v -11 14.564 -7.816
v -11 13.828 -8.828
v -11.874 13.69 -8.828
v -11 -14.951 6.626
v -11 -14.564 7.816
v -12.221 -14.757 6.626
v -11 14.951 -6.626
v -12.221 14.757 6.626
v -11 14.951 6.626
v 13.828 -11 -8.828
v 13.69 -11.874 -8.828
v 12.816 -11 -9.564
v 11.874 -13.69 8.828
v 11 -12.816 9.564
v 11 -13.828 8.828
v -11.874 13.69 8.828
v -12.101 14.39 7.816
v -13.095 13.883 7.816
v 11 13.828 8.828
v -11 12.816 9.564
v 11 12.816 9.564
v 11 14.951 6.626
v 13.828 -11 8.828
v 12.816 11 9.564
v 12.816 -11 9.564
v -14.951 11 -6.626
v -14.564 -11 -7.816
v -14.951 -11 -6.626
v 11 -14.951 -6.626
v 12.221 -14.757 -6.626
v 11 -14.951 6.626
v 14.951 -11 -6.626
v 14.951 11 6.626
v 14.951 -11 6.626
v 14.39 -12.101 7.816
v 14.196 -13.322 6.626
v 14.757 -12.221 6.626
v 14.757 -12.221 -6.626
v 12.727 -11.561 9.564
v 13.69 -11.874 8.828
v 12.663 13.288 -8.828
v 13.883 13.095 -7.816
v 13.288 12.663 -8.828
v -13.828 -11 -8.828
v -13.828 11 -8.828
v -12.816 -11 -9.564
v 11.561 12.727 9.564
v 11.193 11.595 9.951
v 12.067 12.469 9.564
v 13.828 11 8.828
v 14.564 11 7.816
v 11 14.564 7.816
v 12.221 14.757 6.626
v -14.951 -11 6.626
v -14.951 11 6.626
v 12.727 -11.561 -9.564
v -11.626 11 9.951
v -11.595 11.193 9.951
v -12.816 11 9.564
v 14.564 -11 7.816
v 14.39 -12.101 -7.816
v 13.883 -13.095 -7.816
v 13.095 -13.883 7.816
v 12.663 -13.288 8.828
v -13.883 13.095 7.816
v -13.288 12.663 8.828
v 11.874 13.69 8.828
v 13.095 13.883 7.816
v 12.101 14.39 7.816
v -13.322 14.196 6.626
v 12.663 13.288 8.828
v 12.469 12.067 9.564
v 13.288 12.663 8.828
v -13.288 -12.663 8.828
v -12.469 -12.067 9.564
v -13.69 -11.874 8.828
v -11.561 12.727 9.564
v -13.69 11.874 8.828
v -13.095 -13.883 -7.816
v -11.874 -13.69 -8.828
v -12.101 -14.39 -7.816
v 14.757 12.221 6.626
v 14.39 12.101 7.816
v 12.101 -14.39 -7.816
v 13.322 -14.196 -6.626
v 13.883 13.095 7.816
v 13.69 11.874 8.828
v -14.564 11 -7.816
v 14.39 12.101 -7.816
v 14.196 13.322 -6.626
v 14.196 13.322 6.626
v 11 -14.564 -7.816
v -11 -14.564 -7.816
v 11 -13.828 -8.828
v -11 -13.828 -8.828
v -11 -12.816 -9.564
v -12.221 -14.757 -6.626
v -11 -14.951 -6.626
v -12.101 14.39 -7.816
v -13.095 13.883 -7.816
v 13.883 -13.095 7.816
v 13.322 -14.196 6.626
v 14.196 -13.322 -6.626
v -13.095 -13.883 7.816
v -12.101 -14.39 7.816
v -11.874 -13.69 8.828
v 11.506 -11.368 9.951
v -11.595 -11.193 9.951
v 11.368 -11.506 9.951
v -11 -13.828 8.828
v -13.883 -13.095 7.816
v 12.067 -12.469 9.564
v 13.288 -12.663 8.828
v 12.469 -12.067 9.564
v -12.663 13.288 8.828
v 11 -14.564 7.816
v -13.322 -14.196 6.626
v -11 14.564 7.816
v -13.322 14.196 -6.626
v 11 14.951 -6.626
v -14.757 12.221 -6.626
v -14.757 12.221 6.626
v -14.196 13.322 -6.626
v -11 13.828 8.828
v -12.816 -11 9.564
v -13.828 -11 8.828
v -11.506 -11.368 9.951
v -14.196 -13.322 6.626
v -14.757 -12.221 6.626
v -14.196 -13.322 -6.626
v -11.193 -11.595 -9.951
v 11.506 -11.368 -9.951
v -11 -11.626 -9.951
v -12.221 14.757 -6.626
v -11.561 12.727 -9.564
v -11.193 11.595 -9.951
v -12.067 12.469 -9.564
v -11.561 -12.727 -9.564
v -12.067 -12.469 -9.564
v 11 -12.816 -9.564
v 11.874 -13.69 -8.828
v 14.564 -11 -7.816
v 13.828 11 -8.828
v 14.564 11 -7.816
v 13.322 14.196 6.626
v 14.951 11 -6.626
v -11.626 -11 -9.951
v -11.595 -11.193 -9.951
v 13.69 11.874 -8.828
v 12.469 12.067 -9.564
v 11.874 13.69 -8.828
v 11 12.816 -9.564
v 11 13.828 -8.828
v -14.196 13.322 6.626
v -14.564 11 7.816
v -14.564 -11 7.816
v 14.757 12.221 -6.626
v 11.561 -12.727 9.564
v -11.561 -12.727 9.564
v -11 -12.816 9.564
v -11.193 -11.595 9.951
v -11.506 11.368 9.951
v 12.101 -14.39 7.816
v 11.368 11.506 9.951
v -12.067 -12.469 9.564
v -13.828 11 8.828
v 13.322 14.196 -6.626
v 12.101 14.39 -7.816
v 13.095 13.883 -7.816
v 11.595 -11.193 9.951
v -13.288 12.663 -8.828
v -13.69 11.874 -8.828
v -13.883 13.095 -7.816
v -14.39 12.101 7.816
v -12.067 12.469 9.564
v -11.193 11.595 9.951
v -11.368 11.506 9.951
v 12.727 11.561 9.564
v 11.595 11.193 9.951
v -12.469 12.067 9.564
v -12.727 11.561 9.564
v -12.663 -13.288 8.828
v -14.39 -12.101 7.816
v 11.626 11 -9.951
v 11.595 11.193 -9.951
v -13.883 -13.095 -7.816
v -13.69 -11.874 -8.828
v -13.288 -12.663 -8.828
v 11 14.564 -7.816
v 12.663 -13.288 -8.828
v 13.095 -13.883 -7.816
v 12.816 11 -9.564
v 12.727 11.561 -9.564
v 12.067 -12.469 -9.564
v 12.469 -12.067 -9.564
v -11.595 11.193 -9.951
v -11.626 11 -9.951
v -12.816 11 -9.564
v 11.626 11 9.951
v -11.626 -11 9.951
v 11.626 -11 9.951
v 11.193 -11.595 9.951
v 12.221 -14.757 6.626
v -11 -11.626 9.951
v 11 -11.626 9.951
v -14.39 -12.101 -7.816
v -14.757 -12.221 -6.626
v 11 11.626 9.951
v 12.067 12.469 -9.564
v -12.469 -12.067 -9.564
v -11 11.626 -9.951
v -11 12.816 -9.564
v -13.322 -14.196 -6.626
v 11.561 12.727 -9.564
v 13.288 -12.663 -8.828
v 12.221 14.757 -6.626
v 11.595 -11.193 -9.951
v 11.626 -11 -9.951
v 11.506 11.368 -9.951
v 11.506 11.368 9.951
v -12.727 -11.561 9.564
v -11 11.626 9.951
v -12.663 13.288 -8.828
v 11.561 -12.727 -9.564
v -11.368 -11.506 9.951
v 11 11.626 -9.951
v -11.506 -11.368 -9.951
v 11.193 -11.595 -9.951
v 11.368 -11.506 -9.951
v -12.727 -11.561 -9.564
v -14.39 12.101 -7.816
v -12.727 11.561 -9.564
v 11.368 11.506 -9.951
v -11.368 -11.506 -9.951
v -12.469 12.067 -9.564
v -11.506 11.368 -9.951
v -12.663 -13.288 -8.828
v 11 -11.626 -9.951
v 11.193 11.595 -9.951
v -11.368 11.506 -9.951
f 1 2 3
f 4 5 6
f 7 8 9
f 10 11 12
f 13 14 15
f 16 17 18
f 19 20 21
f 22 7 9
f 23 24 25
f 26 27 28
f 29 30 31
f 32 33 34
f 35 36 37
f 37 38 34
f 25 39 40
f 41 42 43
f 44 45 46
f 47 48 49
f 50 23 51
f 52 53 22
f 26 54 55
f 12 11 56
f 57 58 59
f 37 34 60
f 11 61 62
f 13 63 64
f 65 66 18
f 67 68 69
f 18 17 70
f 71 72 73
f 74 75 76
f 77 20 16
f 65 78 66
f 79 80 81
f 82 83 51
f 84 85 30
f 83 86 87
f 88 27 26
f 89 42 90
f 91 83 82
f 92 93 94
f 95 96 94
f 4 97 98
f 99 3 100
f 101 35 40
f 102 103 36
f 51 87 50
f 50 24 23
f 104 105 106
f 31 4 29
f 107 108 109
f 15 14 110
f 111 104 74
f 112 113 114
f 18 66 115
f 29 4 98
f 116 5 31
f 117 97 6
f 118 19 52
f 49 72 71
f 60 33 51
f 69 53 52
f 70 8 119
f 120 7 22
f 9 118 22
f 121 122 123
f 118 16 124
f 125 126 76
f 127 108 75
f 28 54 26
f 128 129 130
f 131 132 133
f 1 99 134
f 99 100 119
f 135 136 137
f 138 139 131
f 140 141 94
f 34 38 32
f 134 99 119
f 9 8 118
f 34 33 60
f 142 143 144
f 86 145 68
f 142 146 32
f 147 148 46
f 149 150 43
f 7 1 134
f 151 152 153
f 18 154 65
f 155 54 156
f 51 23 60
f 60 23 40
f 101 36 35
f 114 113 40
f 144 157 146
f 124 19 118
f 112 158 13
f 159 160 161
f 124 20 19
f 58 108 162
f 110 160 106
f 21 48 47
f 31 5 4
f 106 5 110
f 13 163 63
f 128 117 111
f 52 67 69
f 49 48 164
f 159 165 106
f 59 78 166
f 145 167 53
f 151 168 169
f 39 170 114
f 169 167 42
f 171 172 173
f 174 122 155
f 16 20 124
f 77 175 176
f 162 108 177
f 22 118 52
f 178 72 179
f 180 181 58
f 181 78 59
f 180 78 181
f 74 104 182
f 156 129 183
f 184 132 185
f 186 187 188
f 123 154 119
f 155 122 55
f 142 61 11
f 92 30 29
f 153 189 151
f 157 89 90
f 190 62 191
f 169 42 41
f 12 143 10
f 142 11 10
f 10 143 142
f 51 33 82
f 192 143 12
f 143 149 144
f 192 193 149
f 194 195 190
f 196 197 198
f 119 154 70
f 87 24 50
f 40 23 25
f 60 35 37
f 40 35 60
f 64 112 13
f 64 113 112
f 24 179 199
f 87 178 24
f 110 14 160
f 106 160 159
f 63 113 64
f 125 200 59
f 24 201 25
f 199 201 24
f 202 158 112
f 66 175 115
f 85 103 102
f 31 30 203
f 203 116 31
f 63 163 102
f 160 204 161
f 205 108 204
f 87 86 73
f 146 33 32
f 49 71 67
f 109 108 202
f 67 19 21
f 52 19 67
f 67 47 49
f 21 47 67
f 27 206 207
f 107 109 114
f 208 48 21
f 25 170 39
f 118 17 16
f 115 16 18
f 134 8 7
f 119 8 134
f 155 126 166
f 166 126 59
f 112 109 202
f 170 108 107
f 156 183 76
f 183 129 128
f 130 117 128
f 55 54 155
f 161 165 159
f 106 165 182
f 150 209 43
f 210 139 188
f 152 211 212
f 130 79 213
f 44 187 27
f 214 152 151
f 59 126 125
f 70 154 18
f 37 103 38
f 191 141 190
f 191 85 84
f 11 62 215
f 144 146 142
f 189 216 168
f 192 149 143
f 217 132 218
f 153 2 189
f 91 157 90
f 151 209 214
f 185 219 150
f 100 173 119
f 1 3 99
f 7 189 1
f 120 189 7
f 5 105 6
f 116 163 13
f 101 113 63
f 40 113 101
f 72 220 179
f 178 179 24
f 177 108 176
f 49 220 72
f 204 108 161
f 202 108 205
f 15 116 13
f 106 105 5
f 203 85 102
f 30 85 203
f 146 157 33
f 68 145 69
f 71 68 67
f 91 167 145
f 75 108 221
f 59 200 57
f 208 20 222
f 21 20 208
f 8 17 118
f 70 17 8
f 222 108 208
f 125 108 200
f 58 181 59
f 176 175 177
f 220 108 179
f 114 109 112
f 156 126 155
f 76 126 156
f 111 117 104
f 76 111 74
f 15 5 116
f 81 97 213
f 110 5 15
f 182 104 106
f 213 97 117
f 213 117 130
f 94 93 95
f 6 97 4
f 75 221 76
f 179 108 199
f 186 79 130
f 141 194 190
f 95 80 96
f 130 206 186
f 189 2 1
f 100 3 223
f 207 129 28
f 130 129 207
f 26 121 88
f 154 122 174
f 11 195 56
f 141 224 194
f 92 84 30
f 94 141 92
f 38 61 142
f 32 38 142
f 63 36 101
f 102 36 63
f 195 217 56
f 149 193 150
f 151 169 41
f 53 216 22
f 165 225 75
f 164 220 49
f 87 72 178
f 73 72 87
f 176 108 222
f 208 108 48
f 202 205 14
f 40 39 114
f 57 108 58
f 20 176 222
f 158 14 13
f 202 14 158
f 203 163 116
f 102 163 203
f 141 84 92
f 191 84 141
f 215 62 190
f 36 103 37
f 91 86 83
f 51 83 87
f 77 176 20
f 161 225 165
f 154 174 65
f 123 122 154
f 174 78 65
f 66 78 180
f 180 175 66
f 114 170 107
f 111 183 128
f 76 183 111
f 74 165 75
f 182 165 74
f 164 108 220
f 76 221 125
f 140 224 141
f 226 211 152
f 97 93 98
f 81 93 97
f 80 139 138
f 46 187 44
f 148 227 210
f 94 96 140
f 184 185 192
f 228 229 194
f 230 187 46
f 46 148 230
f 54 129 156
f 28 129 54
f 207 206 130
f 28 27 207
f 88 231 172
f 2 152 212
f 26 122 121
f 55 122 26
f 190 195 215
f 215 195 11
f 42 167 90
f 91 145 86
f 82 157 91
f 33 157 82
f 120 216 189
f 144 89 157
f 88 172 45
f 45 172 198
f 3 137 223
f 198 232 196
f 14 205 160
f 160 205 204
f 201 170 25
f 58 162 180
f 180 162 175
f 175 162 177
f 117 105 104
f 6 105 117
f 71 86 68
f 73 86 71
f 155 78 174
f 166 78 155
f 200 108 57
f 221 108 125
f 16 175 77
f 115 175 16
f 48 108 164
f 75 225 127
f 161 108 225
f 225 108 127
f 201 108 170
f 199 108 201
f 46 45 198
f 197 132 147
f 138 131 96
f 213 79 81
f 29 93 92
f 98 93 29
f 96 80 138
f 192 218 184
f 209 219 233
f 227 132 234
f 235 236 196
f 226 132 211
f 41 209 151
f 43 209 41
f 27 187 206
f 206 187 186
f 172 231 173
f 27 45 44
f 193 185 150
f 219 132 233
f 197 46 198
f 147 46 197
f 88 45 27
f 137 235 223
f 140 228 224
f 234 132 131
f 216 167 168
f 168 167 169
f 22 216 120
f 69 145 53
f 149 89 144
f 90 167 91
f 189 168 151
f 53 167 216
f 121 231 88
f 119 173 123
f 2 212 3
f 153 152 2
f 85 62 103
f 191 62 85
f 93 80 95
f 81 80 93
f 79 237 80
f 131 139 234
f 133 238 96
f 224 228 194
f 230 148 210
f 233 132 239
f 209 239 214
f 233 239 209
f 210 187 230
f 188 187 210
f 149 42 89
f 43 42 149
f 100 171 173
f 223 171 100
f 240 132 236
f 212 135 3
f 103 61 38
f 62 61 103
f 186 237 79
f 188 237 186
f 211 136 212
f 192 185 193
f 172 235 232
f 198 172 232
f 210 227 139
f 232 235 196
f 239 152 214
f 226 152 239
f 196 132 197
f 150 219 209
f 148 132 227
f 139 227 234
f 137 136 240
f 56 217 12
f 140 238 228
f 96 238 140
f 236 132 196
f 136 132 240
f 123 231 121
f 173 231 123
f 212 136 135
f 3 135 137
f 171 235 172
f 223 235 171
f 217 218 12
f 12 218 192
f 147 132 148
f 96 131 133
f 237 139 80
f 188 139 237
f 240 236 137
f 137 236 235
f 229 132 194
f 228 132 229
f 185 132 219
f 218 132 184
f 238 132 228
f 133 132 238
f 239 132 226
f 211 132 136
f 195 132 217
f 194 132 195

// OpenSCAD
//-- Constantes para acceder vectores X, Y y Z
X=0;
Y=1;
Z=2;

//-- Parámetros
r=4;            //-- Radio curvas
A=[30,30,20];   //-- Dimensiones

//-- Calcular coordenadas
a=(A-[2*r,2*r,2*r])/2;

//-- Obtener coordenadas
x=a[X];
y=a[Y];
z=a[Z];

//-- Calcular vértices
vertice=[
    [x,y,z],
    [-x,y,z],
    [-x,-y,z],
    [x,-y,z],
    [x,y,-z],
    [-x,y,-z],
    [-x,-y,-z],
    [x,-y,-z],
];

//-- Cubo sin redondear
*color("red")
    cube(A,center=true);

//-- Cubo redondeado
hull()
    for(pos=vertice)
        translate(pos)
            sphere(r=r,$fn=20);
